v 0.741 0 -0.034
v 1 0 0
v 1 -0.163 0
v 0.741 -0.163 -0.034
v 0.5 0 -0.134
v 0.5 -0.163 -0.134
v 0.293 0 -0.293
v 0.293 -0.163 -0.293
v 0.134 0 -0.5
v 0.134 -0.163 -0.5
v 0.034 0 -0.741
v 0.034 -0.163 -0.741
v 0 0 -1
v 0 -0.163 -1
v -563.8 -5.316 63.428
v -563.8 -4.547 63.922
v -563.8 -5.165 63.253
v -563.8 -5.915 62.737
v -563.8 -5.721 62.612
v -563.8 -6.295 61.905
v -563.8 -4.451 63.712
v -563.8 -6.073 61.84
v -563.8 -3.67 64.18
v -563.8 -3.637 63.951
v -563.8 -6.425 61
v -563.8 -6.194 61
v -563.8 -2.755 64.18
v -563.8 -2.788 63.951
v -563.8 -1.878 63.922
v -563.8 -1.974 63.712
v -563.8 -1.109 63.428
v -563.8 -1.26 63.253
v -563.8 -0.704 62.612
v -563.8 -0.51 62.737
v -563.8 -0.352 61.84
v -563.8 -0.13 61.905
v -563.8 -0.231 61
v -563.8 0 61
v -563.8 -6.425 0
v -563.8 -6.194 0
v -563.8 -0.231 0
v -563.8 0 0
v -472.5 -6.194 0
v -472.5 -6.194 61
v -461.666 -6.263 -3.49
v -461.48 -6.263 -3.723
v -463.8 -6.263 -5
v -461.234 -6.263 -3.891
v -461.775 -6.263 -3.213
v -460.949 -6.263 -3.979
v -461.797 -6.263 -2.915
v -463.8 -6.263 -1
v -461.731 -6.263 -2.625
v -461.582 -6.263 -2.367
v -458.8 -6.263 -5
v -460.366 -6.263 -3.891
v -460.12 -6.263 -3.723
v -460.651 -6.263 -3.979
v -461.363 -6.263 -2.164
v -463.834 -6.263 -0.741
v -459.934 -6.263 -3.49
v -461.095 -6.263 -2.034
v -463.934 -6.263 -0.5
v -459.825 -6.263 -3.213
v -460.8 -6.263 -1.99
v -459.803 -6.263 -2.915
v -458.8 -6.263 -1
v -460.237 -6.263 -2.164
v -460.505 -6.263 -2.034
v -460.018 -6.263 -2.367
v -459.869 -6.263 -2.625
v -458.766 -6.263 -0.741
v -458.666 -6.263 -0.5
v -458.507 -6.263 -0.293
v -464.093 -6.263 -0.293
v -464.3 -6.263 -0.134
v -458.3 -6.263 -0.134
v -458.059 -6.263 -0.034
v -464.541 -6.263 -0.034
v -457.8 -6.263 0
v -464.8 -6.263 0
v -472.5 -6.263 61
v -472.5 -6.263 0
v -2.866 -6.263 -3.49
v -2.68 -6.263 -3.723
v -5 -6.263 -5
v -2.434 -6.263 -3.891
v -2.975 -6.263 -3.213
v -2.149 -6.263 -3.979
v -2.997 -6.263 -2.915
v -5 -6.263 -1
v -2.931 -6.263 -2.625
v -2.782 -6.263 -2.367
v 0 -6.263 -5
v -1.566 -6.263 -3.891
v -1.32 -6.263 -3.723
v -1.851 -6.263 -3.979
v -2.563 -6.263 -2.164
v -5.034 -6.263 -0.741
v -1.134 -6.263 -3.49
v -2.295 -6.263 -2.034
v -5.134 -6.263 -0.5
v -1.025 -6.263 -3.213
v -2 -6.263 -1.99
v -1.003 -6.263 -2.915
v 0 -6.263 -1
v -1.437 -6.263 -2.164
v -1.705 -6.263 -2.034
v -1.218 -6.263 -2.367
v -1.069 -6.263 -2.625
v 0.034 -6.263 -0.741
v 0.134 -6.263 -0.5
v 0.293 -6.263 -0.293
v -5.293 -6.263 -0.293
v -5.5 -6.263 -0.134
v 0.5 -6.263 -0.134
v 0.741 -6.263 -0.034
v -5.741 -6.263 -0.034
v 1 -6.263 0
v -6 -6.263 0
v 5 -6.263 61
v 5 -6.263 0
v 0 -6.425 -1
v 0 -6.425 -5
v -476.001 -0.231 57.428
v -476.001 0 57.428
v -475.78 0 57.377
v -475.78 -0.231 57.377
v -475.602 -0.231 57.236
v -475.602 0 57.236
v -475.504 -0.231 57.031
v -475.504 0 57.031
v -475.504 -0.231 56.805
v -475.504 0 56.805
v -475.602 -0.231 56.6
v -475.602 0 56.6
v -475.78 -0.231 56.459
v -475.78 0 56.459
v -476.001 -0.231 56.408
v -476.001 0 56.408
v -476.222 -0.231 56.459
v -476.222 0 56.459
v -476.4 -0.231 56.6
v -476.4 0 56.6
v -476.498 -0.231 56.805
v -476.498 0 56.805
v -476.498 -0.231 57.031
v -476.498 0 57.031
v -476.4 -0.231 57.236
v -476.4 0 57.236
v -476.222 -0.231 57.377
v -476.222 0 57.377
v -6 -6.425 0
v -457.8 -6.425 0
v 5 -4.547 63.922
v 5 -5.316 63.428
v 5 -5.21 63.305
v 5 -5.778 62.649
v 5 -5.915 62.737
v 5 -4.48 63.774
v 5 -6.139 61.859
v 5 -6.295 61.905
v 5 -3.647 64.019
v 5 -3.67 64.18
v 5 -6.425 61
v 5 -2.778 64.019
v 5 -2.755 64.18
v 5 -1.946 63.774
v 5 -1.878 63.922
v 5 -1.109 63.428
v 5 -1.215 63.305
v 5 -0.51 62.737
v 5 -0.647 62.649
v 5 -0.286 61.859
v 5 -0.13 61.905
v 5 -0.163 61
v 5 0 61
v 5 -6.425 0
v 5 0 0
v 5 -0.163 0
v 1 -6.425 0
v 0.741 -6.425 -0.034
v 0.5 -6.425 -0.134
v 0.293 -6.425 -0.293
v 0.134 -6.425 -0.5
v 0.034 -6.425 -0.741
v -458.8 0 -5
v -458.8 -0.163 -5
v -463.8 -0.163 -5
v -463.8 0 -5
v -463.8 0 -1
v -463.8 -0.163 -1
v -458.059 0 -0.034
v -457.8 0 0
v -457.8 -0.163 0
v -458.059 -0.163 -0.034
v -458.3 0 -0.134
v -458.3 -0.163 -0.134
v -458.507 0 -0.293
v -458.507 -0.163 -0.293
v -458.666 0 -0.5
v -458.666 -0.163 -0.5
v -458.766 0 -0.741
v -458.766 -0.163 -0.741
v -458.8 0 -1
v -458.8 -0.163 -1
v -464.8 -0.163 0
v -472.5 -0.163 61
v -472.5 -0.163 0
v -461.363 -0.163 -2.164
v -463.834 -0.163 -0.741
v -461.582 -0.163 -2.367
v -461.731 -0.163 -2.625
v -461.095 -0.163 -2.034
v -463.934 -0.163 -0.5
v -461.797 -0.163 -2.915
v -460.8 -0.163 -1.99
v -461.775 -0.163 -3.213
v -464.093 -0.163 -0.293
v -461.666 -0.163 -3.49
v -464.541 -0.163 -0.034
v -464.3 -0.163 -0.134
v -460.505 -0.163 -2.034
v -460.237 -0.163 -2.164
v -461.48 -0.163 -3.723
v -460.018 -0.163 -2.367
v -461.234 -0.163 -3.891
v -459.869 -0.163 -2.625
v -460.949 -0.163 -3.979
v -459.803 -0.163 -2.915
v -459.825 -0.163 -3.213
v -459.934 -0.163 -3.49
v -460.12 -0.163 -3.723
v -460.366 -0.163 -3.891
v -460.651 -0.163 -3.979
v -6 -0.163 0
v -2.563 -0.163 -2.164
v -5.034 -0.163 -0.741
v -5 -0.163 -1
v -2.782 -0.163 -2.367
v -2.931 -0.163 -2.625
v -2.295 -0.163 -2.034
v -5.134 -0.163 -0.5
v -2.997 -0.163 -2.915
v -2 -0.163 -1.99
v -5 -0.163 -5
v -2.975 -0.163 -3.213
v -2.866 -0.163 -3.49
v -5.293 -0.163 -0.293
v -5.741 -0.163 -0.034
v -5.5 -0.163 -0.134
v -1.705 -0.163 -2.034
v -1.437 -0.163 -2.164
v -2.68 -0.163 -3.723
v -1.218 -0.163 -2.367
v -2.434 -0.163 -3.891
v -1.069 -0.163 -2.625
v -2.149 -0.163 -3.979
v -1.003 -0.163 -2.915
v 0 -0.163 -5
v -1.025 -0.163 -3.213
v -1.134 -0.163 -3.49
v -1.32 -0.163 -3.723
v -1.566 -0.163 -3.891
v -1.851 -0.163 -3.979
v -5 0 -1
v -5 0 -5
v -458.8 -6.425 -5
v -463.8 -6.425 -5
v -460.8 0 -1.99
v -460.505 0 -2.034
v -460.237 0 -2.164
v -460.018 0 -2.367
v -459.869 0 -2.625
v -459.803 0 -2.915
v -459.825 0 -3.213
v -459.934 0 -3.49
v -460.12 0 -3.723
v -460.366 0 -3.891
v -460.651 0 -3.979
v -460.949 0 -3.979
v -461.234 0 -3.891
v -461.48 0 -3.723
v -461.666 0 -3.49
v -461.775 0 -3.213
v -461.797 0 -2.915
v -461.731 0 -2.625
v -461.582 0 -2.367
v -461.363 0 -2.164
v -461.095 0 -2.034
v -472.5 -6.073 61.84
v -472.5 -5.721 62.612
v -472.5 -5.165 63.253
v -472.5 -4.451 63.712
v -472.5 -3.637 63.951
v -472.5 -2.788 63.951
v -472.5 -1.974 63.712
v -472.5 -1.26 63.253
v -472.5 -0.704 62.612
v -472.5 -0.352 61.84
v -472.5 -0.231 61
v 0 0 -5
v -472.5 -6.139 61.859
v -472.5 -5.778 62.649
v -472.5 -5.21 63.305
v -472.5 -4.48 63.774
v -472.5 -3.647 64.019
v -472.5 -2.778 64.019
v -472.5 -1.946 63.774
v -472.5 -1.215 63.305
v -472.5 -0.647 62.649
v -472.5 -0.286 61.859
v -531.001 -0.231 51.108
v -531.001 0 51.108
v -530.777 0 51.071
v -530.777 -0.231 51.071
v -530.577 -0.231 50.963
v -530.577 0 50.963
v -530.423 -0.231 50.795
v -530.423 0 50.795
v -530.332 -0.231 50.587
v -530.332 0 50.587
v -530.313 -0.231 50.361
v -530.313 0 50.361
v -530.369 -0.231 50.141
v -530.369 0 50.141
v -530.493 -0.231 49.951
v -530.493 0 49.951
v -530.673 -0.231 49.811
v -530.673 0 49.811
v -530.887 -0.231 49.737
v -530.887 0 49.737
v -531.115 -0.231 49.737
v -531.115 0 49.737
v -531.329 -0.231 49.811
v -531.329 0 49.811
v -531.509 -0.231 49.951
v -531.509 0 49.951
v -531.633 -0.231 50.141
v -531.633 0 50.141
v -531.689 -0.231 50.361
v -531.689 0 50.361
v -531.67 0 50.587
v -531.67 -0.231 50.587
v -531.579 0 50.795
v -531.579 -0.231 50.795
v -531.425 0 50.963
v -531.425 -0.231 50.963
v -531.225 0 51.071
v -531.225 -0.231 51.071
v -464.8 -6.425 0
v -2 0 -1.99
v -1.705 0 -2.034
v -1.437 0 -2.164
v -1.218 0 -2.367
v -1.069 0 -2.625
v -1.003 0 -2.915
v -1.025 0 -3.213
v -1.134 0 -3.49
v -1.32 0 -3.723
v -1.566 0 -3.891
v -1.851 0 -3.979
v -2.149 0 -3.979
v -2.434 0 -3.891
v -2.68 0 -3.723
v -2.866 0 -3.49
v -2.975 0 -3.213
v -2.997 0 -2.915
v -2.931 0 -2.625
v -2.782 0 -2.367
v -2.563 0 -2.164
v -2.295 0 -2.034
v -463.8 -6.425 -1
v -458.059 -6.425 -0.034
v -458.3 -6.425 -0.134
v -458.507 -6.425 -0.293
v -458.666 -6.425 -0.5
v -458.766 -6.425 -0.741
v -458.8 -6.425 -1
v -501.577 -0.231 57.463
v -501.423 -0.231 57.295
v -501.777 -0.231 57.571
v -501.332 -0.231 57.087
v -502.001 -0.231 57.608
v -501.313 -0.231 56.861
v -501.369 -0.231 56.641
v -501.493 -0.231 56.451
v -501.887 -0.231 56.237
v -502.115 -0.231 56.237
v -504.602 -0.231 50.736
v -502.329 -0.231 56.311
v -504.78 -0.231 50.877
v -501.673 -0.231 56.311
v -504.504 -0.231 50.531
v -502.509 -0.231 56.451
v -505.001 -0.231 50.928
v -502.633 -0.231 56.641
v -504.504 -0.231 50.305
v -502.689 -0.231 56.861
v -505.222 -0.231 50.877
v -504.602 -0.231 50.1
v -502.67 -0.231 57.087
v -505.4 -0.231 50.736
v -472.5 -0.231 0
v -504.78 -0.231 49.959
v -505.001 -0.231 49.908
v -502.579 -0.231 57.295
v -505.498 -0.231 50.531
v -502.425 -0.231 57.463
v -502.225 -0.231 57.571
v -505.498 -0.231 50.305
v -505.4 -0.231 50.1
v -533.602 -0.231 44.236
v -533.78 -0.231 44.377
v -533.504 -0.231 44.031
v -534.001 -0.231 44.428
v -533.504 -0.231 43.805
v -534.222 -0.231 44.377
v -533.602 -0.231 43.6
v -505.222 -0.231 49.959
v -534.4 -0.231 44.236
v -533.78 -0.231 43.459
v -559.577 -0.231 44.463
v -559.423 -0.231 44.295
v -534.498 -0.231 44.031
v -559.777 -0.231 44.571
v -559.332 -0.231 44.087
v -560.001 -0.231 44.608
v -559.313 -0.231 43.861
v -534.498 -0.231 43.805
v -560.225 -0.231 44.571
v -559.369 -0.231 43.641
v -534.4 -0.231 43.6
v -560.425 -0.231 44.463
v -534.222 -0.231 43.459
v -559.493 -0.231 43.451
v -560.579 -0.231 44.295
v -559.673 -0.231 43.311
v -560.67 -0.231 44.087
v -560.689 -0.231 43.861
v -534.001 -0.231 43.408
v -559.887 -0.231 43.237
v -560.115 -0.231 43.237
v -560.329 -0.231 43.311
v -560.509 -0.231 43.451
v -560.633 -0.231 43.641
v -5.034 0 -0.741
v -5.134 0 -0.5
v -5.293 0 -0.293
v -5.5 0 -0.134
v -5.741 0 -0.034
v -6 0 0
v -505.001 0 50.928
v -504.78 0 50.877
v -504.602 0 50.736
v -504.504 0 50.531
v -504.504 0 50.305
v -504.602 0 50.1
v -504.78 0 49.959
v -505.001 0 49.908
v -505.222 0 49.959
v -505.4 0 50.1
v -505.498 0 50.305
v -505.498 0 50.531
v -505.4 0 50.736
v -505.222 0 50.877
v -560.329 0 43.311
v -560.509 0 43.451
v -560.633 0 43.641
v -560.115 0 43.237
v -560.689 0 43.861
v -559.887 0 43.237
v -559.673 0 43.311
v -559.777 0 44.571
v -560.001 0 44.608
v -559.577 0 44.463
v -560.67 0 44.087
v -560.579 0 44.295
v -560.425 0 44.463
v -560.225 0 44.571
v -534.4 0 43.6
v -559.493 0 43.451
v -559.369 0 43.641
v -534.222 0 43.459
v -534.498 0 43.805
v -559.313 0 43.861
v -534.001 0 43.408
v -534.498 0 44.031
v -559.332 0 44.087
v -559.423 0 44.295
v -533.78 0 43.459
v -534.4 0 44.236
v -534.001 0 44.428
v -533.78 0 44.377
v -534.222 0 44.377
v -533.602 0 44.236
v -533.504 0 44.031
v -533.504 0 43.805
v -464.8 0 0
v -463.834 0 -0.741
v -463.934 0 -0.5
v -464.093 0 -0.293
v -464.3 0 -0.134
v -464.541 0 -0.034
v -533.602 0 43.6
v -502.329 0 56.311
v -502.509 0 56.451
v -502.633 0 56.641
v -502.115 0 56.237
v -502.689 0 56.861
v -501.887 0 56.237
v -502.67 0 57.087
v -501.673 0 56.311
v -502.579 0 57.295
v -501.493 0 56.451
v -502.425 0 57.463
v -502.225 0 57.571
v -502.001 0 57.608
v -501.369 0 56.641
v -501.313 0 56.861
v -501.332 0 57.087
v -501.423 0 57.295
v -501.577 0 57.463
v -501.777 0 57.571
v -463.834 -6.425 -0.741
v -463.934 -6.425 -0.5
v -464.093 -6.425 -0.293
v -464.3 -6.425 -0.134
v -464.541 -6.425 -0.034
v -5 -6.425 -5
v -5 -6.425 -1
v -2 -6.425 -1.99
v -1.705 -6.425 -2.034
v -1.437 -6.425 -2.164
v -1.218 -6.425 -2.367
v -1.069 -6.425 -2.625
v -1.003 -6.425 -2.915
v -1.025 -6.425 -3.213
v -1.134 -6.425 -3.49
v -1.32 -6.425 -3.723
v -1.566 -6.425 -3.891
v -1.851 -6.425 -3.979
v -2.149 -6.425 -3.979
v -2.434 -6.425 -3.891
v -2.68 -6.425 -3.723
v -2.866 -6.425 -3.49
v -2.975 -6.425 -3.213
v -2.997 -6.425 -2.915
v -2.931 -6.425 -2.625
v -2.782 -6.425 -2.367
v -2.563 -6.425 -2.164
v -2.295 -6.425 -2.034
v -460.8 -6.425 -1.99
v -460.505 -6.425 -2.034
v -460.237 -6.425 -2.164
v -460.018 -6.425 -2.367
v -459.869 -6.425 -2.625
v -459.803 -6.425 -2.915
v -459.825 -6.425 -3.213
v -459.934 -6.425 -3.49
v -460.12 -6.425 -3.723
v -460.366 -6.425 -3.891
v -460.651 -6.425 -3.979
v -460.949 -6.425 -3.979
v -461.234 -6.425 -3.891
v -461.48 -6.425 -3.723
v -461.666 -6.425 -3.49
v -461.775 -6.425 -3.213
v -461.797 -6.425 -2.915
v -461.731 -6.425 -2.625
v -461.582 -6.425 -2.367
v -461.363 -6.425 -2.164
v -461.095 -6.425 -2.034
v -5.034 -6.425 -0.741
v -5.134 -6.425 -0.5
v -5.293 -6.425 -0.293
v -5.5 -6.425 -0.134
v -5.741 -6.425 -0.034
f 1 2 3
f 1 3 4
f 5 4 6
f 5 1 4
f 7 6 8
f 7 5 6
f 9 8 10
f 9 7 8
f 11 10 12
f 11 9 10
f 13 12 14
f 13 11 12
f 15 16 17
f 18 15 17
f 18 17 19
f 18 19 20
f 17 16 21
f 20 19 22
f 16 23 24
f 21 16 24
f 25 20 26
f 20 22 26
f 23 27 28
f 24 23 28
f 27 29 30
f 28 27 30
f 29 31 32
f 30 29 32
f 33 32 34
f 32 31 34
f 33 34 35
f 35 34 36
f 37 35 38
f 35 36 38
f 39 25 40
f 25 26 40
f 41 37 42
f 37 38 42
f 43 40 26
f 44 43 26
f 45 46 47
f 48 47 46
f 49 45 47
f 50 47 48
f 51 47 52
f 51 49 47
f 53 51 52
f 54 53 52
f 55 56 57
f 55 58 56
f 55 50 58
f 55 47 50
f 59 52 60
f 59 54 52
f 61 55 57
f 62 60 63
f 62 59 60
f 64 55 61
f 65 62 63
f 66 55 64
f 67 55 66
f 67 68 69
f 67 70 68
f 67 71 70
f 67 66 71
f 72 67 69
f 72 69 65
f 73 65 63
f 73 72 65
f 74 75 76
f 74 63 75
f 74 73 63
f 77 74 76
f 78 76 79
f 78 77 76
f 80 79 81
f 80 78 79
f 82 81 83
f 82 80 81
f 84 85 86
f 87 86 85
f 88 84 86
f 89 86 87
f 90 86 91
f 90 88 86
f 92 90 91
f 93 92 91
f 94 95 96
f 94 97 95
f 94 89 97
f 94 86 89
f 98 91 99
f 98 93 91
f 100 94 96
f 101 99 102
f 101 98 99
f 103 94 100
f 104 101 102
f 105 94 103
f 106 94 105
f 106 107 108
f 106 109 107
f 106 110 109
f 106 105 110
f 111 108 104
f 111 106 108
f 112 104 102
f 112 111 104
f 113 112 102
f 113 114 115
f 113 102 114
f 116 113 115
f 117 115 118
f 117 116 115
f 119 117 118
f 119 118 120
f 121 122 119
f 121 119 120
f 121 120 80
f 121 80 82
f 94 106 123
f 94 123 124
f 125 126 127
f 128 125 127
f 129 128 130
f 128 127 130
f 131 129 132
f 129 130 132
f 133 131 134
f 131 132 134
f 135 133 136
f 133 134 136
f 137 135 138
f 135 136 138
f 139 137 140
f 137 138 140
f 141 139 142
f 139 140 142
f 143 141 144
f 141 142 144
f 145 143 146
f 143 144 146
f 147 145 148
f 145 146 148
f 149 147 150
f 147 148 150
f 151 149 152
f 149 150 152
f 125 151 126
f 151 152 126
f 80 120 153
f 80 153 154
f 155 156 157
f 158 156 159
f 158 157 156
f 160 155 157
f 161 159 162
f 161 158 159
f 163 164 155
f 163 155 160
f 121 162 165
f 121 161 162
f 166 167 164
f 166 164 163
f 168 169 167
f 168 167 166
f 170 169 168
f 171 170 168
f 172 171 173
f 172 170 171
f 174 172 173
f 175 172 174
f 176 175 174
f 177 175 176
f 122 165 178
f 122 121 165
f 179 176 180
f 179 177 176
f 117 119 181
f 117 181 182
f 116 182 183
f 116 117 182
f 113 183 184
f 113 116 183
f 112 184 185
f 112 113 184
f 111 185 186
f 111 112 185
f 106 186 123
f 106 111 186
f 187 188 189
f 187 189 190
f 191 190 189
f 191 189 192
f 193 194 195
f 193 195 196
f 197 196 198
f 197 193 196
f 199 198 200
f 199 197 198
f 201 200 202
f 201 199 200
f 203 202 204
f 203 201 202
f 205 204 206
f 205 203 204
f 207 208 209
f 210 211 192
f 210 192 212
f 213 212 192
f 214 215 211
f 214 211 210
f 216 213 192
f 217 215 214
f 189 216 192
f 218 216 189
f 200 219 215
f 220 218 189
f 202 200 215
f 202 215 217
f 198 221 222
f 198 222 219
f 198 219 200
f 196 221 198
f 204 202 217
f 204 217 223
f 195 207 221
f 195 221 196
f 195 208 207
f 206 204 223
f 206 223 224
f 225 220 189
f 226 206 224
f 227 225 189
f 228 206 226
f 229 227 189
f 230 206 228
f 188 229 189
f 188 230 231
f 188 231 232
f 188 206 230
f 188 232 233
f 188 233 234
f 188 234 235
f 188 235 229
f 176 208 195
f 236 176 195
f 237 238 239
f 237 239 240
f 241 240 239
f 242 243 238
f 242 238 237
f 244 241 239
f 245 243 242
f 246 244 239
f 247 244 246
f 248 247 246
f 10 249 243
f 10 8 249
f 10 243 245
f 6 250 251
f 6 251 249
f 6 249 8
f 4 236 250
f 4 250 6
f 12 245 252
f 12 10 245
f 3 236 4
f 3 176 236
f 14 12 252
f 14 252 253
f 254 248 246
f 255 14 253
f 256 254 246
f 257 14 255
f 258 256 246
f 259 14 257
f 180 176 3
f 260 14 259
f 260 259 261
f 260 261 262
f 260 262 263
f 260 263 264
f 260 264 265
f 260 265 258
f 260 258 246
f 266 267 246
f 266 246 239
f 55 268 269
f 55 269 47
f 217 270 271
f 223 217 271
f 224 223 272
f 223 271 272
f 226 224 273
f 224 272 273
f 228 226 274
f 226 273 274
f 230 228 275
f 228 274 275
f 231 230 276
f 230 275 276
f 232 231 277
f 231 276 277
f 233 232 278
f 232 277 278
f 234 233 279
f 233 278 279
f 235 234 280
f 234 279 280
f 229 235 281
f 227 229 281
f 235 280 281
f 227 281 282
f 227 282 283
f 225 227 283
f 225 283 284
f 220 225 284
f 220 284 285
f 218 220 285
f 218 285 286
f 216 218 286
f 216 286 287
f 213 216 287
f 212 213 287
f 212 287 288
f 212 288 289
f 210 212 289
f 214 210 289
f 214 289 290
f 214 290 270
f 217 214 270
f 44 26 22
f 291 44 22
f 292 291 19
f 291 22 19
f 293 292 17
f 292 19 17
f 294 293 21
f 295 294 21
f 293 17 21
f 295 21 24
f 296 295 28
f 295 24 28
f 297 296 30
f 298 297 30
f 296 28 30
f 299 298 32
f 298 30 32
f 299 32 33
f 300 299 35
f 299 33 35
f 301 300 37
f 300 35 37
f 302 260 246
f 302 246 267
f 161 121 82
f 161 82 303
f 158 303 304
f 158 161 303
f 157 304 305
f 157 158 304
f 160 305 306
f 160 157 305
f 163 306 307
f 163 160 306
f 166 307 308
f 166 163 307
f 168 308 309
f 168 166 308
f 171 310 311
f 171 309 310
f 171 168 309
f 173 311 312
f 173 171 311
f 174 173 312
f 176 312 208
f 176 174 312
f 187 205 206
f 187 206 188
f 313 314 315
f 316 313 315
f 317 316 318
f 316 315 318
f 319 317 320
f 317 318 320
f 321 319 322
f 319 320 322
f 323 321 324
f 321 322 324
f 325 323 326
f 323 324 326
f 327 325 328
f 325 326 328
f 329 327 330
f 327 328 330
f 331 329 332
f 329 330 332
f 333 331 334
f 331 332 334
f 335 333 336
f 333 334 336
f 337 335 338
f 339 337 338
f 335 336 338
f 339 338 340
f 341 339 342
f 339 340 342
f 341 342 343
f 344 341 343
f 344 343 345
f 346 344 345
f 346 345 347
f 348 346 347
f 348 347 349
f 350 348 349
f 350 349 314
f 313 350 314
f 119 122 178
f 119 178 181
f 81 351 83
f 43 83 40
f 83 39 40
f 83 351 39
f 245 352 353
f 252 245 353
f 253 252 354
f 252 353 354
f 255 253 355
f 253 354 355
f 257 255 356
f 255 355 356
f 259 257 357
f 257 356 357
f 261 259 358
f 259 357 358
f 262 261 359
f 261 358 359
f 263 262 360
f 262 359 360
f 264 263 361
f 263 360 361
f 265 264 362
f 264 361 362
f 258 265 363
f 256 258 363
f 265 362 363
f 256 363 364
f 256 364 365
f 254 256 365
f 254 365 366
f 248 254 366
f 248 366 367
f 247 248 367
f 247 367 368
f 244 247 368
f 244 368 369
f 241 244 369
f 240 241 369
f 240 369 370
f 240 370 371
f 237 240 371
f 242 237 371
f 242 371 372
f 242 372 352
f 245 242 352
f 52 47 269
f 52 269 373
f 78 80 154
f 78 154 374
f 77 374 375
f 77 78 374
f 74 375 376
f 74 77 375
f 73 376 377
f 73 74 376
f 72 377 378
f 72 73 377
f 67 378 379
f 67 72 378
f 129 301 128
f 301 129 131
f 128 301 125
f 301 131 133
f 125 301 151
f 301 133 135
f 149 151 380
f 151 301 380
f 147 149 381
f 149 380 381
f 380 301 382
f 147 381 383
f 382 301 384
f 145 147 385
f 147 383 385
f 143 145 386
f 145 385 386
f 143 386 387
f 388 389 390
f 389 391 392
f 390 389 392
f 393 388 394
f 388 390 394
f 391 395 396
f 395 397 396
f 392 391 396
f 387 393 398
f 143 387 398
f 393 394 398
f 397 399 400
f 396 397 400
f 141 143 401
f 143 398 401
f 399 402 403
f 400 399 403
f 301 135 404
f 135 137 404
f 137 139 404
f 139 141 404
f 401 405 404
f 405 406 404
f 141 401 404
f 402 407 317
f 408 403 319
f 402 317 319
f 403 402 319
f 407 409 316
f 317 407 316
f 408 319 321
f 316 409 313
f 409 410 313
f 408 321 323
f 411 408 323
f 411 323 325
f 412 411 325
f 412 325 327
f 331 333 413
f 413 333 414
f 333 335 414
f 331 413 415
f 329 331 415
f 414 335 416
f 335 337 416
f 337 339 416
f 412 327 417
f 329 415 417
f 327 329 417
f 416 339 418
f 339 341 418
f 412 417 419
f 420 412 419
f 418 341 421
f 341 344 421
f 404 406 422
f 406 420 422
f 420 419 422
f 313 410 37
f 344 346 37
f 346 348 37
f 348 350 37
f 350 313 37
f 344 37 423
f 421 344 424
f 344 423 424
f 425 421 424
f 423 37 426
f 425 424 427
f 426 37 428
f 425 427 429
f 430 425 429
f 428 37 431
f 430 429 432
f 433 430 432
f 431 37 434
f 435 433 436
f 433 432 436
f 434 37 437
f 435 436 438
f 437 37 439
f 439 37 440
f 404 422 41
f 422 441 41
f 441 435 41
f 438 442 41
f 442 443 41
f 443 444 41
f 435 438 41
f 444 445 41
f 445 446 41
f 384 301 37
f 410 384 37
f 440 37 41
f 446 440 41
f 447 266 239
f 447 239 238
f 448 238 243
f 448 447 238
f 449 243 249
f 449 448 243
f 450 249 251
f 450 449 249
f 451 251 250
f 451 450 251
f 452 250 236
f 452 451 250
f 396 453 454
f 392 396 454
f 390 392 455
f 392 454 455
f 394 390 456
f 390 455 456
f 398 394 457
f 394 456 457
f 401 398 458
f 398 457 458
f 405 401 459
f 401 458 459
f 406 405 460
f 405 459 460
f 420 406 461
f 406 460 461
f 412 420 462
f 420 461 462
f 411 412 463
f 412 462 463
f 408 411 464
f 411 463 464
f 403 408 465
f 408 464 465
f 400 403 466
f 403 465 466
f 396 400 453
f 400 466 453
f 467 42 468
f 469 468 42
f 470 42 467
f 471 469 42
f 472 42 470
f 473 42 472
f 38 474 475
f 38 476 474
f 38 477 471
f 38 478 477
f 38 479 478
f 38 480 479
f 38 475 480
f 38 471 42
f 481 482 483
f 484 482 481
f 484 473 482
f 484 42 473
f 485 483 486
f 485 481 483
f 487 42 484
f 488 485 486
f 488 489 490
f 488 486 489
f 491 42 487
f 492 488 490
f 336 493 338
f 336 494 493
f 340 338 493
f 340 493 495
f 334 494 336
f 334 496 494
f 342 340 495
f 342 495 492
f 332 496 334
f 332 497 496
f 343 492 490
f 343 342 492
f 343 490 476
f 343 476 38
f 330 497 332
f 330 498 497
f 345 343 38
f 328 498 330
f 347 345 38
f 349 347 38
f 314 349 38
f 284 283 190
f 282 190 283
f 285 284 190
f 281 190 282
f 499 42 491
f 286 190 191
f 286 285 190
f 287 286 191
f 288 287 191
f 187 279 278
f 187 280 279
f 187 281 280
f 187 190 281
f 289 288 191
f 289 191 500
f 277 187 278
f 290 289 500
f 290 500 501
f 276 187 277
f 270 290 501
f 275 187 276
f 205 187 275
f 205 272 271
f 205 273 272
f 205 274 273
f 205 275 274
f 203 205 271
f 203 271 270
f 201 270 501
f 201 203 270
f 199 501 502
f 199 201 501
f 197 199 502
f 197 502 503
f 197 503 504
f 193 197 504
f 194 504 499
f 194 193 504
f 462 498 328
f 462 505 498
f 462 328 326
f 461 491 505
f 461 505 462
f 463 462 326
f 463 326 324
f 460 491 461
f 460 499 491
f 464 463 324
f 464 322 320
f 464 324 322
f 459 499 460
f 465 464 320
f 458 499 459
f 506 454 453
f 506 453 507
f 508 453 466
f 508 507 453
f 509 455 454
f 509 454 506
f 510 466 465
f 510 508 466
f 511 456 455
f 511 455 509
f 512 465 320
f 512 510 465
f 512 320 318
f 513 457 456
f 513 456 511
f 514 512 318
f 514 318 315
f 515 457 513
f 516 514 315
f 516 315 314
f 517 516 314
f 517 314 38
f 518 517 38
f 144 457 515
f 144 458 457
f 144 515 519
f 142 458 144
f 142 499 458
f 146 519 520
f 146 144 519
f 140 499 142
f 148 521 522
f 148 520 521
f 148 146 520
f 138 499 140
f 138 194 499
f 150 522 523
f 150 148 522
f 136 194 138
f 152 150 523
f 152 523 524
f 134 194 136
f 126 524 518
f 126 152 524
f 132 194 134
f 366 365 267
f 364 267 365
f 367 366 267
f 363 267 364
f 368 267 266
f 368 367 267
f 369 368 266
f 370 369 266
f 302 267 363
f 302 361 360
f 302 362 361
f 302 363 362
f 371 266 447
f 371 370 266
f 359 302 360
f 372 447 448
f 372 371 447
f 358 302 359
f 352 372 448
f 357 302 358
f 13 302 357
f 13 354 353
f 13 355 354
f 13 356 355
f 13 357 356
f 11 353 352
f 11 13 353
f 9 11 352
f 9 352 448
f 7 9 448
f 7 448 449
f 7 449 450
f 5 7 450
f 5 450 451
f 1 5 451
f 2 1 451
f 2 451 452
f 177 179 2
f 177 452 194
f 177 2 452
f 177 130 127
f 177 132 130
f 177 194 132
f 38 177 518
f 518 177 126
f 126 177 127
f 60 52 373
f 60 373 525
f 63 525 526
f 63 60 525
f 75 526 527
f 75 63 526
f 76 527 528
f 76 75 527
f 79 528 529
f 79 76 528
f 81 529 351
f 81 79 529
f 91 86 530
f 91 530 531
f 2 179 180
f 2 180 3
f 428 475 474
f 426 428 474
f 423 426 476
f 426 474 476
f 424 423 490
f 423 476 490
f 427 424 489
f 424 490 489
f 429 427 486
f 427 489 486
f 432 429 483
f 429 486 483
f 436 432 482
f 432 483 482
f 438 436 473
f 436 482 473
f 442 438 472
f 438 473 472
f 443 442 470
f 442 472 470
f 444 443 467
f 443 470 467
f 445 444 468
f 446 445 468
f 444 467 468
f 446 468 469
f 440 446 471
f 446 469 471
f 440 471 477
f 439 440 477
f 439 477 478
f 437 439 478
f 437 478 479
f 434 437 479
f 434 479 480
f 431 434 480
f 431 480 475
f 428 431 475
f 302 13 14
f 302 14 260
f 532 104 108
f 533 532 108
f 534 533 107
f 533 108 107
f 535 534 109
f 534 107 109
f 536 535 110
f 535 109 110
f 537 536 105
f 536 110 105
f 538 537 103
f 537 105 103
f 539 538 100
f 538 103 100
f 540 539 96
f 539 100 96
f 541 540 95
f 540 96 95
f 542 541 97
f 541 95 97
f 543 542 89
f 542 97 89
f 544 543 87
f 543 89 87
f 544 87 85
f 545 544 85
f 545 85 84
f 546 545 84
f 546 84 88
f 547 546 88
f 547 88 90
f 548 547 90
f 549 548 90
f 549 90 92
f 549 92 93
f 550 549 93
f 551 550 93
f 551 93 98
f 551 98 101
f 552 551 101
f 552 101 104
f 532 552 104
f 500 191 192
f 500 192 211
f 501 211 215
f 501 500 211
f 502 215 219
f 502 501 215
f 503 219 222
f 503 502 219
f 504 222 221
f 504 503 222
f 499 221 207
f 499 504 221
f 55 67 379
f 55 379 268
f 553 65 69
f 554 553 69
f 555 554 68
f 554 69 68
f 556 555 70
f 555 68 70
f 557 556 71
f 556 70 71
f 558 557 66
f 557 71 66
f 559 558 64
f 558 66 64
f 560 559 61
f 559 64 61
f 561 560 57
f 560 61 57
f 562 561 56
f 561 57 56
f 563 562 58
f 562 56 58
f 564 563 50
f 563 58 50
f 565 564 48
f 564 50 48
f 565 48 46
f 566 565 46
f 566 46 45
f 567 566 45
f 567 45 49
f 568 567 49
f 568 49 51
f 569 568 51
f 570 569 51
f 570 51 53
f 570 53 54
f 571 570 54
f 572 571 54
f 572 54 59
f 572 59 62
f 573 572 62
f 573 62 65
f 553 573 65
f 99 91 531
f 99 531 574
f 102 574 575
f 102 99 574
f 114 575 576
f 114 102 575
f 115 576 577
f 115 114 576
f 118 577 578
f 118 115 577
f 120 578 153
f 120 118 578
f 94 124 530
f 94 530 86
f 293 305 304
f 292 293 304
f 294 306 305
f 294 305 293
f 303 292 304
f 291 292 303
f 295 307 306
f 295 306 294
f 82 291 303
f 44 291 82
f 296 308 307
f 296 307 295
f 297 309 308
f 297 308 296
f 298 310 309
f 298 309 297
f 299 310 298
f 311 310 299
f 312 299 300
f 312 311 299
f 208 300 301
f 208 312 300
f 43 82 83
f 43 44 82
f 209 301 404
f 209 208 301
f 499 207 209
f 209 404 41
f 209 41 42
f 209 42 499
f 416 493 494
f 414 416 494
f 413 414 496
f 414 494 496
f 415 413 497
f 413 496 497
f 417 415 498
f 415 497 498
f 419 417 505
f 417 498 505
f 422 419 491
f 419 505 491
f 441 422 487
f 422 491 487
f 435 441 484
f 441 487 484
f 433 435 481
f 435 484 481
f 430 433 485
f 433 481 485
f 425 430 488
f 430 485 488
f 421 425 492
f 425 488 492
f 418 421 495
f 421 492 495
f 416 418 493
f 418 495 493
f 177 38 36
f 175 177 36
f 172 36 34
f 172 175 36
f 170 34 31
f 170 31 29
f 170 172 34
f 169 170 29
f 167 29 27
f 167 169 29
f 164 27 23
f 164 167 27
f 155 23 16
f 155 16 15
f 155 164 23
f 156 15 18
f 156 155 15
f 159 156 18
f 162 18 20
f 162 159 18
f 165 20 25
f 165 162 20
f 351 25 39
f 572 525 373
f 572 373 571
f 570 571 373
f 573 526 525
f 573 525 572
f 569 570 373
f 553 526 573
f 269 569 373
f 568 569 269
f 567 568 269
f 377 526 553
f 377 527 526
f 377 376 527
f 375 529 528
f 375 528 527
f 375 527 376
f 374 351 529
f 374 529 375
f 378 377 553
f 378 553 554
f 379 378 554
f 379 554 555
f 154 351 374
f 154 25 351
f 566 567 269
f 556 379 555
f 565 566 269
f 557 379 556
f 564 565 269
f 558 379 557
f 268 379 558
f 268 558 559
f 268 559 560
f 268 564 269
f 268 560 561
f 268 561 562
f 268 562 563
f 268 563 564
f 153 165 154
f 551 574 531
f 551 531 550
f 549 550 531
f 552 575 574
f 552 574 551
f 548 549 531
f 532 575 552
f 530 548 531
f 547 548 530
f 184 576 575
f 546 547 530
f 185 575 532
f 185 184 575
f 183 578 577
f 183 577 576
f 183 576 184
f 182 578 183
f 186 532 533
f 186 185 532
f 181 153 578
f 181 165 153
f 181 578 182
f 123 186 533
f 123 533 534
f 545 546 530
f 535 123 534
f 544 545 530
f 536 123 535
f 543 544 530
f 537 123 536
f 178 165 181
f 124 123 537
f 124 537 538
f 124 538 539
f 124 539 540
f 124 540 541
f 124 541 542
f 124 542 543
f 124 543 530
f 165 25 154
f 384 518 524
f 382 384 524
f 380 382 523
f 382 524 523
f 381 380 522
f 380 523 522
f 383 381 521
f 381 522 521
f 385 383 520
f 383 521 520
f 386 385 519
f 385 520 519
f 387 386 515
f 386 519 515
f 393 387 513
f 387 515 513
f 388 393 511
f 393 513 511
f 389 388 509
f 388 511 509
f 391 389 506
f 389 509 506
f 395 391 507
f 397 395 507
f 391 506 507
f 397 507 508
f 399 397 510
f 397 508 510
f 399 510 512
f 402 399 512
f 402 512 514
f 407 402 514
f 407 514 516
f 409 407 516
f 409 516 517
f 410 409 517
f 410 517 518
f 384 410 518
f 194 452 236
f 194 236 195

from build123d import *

# Parameters (mm, degrees)
BOSS_EXTRUDE1_DEPTH      = 5
BOSS_EXTRUDE1_DEPTH_BACK = 563.8
CUT_EXTRUDE1_DEPTH       = 7.42512
BOSS_EXTRUDE2_DEPTH      = 91.3
SKETCH4_R                = 0.69
SKETCH4_R_2              = 0.51
CUT_EXTRUDE2_DEPTH       = 2
SKETCH5_R                = 1
CUT_EXTRUDE3_DEPTH       = 7.42512


with BuildPart() as part:
    # Sketch1 → Boss-Extrude1 (new body, two sides)
    with BuildSketch(Plane(origin=(0, 0, 0), x_dir=(0, 0, -1), z_dir=(1, 0, 0))) as boss_extrude1_sk:
        with BuildLine():
            Line((0, 0), (-61, 0))
            ThreePointArc((-61, 0), (-64.21256, -3.21256), (-61, -6.42512))
            Line((-61, -6.42512), (0, -6.42512))
            Line((0, -6.42512), (5, -6.42512))
            Line((5, -6.42512), (5, -6.26256))
            Line((5, -6.26256), (-61, -6.26256))
            ThreePointArc((-61, -6.26256), (-64.05, -3.21256), (-61, -0.16256))
            Line((-61, -0.16256), (5, -0.16256))
            Line((5, -0.16256), (5, 0))
            Line((5, 0), (0, 0))
        make_face()
    extrude(amount=BOSS_EXTRUDE1_DEPTH)
    extrude(boss_extrude1_sk.sketch, amount=-BOSS_EXTRUDE1_DEPTH_BACK)

    # Sketch2 → Cut-Extrude1 (cut, through all)
    with BuildSketch(Plane(origin=(0, 0, 0), x_dir=(1, 0, 0), z_dir=(0, 1, 0))):
        with BuildLine():
            Line((5, 0), (1, 0))
            ThreePointArc((1, 0), (0.292893219, 0.292893219), (0, 1))
            Line((0, 1), (0, 5))
            Line((0, 5), (-5, 5))
            Line((-5, 5), (-5, 1))
            ThreePointArc((-5, 1), (-5.292893219, 0.292893219), (-6, 0))
            Line((-6, 0), (-457.8, 0))
            ThreePointArc((-457.8, 0), (-458.507106781, 0.292893219), (-458.8, 1))
            Line((-458.8, 1), (-458.8, 5))
            Line((-458.8, 5), (-463.8, 5))
            Line((-463.8, 5), (-463.8, 1))
            ThreePointArc((-463.8, 1), (-464.092893219, 0.292893219), (-464.8, 0))
            Line((-464.8, 0), (-563.8, 0))
            Line((-563.8, 0), (-563.8, 10))
            Line((-563.8, 10), (5, 10))
            Line((5, 10), (5, 0))
        make_face()
    extrude(amount=-CUT_EXTRUDE1_DEPTH, mode=Mode.SUBTRACT)

    # Sketch3 → Boss-Extrude2 (add)
    with BuildSketch(Plane.ZY.offset(563.8)):
        with BuildLine():
            Line((61, -0.23114), (0, -0.23114))
            Line((0, -0.23114), (0, 0))
            Line((0, 0), (61, 0))
            ThreePointArc((61, 0), (64.21256, -3.21256), (61, -6.42512))
            Line((61, -6.42512), (0, -6.42512))
            Line((0, -6.42512), (0, -6.19398))
            Line((0, -6.19398), (61, -6.19398))
            ThreePointArc((61, -6.19398), (63.98142, -3.21256), (61, -0.23114))
        make_face()
    extrude(amount=-BOSS_EXTRUDE2_DEPTH)

    # Sketch4 → Cut-Extrude2 (cut)
    with BuildSketch(Plane(origin=(0, 0, 0), x_dir=(1, 0, 0), z_dir=(0, 1, 0))):
        with Locations(Location((-560.001, -43.918, 0), (0, 0, 270))):  # turned: the seam where the file's is
            Circle(SKETCH4_R)
        with Locations(Location((-534.001, -43.918, 0), (0, 0, 270))):  # turned: the seam where the file's is
            Circle(SKETCH4_R_2)
        with Locations(Location((-531.001, -50.418, 0), (0, 0, 270))):  # turned: the seam where the file's is
            Circle(SKETCH4_R)
        with Locations(Location((-505.001, -50.418, 0), (0, 0, 270))):  # turned: the seam where the file's is
            Circle(SKETCH4_R_2)
        with Locations(Location((-502.001, -56.918, 0), (0, 0, 270))):  # turned: the seam where the file's is
            Circle(SKETCH4_R)
        with Locations(Location((-476.001, -56.918, 0), (0, 0, 270))):  # turned: the seam where the file's is
            Circle(SKETCH4_R_2)
    extrude(amount=-CUT_EXTRUDE2_DEPTH, mode=Mode.SUBTRACT)

    # Sketch5 → Cut-Extrude3 (cut, through all)
    with BuildSketch(Plane(origin=(0, 0, 0), x_dir=(1, 0, 0), z_dir=(0, 1, 0))):
        with Locations(Location((-460.8, 2.99, 0), (0, 0, 270))):  # turned: the seam where the file's is
            Circle(SKETCH5_R)
        with Locations(Location((-2, 2.99, 0), (0, 0, 270))):  # turned: the seam where the file's is
            Circle(SKETCH5_R)
    extrude(amount=-CUT_EXTRUDE3_DEPTH, mode=Mode.SUBTRACT)


solid = part.part
